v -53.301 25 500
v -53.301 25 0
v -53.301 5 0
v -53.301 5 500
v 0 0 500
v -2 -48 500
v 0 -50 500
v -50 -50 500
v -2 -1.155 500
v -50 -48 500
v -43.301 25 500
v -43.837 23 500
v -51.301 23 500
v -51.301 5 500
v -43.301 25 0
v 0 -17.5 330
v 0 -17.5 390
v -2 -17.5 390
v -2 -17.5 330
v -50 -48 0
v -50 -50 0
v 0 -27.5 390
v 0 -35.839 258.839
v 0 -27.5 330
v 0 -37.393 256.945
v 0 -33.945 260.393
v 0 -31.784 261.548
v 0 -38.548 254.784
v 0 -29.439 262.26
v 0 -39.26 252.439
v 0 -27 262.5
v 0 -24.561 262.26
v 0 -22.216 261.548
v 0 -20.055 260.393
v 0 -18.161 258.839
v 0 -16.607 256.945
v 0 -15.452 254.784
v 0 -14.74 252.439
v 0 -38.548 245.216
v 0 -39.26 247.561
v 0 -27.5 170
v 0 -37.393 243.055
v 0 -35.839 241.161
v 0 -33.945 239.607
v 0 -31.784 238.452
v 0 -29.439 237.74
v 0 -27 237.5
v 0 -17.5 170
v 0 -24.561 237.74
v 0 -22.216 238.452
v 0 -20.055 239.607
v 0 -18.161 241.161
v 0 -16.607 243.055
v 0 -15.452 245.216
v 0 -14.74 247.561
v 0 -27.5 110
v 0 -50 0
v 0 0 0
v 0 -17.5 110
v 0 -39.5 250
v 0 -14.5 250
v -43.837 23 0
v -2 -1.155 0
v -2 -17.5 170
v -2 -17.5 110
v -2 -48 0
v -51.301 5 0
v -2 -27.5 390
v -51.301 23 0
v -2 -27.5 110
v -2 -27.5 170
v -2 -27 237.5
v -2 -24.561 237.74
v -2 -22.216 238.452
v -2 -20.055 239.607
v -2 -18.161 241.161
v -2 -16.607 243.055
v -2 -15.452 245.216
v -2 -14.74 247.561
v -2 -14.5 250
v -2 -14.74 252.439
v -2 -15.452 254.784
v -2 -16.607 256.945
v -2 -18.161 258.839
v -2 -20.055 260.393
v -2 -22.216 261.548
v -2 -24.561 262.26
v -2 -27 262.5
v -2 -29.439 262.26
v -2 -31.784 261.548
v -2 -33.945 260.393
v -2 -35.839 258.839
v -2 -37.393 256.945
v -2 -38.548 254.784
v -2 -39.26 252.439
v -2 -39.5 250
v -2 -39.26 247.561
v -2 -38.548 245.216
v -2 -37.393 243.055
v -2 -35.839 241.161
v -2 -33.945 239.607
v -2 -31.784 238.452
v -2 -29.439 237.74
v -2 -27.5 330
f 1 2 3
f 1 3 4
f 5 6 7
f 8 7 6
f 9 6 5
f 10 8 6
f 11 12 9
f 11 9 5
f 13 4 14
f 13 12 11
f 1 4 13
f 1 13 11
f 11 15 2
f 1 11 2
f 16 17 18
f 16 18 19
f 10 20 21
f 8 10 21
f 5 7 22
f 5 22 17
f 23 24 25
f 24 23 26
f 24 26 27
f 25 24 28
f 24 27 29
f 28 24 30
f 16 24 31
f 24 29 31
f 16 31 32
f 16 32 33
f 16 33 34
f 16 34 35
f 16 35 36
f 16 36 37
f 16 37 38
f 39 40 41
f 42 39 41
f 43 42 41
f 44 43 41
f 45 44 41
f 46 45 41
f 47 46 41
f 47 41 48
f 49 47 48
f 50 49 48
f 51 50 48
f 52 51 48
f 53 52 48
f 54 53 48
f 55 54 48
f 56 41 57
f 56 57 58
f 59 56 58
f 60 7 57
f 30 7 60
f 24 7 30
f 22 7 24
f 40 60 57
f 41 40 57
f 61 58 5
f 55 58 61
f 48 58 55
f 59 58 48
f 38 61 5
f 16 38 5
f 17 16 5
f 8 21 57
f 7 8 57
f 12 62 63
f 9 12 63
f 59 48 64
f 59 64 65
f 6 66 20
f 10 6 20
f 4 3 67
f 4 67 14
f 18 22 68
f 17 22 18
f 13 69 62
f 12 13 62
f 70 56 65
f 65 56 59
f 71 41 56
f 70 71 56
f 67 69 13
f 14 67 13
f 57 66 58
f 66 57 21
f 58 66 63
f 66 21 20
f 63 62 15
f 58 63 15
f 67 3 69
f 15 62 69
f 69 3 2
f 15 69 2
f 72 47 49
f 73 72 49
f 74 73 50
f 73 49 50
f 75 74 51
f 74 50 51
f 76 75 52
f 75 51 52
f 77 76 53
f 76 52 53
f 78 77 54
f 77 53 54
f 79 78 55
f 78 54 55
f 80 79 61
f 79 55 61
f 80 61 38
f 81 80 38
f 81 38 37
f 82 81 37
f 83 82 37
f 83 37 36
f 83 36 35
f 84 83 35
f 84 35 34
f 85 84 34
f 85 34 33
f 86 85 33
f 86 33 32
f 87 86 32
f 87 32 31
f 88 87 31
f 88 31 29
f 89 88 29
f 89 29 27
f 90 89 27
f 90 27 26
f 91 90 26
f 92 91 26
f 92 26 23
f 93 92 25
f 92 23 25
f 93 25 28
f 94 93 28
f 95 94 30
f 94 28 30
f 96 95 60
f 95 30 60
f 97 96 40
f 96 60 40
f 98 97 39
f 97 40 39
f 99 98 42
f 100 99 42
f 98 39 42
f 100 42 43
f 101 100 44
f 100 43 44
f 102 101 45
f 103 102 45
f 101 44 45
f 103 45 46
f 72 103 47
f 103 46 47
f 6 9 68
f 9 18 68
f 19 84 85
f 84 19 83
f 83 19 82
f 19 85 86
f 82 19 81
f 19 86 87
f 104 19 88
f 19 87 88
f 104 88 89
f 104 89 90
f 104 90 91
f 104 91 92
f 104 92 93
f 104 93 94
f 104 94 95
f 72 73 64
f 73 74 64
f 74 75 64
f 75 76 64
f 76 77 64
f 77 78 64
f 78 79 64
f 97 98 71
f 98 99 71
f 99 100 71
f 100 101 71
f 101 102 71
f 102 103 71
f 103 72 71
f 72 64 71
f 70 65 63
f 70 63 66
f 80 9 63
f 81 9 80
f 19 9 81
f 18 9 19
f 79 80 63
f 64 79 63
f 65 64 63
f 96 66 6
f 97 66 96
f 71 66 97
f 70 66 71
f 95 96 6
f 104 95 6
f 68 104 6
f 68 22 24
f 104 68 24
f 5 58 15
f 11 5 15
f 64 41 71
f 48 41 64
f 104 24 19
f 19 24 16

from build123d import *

# Parameters (mm, degrees)
BOSS_EXTRUDE1_DEPTH = 500
SKETCH2_R           = 12.5
CUT_EXTRUDE1_DEPTH  = 54.301270189
SKETCH3_W           = 60
SKETCH3_H           = 10
CUT_EXTRUDE2_DEPTH  = 2
SKETCH4_W           = 500
SKETCH4_H           = 20
BOSS_EXTRUDE2_DEPTH = 2


with BuildPart() as part:
    # Sketch1 → Boss-Extrude1 (new body)
    with BuildSketch(Plane.XY):
        Polygon((0, 0), (-43.301270189, 25), (-53.301270189, 25), (-53.301270189, 23), (-43.837168574, 23), (-2, -1.154700538), (-2, -48), (-50, -48), (-50, -50), (0, -50), align=None)
    extrude(amount=BOSS_EXTRUDE1_DEPTH)

    # Sketch2 → Cut-Extrude1 (cut, through all)
    with BuildSketch(Plane(origin=(0, 0, 0), x_dir=(0, 0, -1), z_dir=(1, 0, 0))):
        with Locations((-250, -27)):
            Circle(SKETCH2_R)
    extrude(amount=-CUT_EXTRUDE1_DEPTH, mode=Mode.SUBTRACT)

    # Sketch3 → Cut-Extrude2 (cut)
    with BuildSketch(Plane(origin=(0, 0, 0), x_dir=(0, 0, -1), z_dir=(1, 0, 0))):
        with Locations((-140, -22.5)):
            Rectangle(SKETCH3_W, SKETCH3_H)
        with Locations((-360, -22.5)):
            Rectangle(SKETCH3_W, SKETCH3_H)
    extrude(amount=-CUT_EXTRUDE2_DEPTH, mode=Mode.SUBTRACT)

    # Sketch4 → Boss-Extrude2 (add)
    with BuildSketch(Plane.ZY.offset(53.301270189)):
        with Locations((250, 15)):
            Rectangle(SKETCH4_W, SKETCH4_H)
    extrude(amount=-BOSS_EXTRUDE2_DEPTH)


solid = part.part
